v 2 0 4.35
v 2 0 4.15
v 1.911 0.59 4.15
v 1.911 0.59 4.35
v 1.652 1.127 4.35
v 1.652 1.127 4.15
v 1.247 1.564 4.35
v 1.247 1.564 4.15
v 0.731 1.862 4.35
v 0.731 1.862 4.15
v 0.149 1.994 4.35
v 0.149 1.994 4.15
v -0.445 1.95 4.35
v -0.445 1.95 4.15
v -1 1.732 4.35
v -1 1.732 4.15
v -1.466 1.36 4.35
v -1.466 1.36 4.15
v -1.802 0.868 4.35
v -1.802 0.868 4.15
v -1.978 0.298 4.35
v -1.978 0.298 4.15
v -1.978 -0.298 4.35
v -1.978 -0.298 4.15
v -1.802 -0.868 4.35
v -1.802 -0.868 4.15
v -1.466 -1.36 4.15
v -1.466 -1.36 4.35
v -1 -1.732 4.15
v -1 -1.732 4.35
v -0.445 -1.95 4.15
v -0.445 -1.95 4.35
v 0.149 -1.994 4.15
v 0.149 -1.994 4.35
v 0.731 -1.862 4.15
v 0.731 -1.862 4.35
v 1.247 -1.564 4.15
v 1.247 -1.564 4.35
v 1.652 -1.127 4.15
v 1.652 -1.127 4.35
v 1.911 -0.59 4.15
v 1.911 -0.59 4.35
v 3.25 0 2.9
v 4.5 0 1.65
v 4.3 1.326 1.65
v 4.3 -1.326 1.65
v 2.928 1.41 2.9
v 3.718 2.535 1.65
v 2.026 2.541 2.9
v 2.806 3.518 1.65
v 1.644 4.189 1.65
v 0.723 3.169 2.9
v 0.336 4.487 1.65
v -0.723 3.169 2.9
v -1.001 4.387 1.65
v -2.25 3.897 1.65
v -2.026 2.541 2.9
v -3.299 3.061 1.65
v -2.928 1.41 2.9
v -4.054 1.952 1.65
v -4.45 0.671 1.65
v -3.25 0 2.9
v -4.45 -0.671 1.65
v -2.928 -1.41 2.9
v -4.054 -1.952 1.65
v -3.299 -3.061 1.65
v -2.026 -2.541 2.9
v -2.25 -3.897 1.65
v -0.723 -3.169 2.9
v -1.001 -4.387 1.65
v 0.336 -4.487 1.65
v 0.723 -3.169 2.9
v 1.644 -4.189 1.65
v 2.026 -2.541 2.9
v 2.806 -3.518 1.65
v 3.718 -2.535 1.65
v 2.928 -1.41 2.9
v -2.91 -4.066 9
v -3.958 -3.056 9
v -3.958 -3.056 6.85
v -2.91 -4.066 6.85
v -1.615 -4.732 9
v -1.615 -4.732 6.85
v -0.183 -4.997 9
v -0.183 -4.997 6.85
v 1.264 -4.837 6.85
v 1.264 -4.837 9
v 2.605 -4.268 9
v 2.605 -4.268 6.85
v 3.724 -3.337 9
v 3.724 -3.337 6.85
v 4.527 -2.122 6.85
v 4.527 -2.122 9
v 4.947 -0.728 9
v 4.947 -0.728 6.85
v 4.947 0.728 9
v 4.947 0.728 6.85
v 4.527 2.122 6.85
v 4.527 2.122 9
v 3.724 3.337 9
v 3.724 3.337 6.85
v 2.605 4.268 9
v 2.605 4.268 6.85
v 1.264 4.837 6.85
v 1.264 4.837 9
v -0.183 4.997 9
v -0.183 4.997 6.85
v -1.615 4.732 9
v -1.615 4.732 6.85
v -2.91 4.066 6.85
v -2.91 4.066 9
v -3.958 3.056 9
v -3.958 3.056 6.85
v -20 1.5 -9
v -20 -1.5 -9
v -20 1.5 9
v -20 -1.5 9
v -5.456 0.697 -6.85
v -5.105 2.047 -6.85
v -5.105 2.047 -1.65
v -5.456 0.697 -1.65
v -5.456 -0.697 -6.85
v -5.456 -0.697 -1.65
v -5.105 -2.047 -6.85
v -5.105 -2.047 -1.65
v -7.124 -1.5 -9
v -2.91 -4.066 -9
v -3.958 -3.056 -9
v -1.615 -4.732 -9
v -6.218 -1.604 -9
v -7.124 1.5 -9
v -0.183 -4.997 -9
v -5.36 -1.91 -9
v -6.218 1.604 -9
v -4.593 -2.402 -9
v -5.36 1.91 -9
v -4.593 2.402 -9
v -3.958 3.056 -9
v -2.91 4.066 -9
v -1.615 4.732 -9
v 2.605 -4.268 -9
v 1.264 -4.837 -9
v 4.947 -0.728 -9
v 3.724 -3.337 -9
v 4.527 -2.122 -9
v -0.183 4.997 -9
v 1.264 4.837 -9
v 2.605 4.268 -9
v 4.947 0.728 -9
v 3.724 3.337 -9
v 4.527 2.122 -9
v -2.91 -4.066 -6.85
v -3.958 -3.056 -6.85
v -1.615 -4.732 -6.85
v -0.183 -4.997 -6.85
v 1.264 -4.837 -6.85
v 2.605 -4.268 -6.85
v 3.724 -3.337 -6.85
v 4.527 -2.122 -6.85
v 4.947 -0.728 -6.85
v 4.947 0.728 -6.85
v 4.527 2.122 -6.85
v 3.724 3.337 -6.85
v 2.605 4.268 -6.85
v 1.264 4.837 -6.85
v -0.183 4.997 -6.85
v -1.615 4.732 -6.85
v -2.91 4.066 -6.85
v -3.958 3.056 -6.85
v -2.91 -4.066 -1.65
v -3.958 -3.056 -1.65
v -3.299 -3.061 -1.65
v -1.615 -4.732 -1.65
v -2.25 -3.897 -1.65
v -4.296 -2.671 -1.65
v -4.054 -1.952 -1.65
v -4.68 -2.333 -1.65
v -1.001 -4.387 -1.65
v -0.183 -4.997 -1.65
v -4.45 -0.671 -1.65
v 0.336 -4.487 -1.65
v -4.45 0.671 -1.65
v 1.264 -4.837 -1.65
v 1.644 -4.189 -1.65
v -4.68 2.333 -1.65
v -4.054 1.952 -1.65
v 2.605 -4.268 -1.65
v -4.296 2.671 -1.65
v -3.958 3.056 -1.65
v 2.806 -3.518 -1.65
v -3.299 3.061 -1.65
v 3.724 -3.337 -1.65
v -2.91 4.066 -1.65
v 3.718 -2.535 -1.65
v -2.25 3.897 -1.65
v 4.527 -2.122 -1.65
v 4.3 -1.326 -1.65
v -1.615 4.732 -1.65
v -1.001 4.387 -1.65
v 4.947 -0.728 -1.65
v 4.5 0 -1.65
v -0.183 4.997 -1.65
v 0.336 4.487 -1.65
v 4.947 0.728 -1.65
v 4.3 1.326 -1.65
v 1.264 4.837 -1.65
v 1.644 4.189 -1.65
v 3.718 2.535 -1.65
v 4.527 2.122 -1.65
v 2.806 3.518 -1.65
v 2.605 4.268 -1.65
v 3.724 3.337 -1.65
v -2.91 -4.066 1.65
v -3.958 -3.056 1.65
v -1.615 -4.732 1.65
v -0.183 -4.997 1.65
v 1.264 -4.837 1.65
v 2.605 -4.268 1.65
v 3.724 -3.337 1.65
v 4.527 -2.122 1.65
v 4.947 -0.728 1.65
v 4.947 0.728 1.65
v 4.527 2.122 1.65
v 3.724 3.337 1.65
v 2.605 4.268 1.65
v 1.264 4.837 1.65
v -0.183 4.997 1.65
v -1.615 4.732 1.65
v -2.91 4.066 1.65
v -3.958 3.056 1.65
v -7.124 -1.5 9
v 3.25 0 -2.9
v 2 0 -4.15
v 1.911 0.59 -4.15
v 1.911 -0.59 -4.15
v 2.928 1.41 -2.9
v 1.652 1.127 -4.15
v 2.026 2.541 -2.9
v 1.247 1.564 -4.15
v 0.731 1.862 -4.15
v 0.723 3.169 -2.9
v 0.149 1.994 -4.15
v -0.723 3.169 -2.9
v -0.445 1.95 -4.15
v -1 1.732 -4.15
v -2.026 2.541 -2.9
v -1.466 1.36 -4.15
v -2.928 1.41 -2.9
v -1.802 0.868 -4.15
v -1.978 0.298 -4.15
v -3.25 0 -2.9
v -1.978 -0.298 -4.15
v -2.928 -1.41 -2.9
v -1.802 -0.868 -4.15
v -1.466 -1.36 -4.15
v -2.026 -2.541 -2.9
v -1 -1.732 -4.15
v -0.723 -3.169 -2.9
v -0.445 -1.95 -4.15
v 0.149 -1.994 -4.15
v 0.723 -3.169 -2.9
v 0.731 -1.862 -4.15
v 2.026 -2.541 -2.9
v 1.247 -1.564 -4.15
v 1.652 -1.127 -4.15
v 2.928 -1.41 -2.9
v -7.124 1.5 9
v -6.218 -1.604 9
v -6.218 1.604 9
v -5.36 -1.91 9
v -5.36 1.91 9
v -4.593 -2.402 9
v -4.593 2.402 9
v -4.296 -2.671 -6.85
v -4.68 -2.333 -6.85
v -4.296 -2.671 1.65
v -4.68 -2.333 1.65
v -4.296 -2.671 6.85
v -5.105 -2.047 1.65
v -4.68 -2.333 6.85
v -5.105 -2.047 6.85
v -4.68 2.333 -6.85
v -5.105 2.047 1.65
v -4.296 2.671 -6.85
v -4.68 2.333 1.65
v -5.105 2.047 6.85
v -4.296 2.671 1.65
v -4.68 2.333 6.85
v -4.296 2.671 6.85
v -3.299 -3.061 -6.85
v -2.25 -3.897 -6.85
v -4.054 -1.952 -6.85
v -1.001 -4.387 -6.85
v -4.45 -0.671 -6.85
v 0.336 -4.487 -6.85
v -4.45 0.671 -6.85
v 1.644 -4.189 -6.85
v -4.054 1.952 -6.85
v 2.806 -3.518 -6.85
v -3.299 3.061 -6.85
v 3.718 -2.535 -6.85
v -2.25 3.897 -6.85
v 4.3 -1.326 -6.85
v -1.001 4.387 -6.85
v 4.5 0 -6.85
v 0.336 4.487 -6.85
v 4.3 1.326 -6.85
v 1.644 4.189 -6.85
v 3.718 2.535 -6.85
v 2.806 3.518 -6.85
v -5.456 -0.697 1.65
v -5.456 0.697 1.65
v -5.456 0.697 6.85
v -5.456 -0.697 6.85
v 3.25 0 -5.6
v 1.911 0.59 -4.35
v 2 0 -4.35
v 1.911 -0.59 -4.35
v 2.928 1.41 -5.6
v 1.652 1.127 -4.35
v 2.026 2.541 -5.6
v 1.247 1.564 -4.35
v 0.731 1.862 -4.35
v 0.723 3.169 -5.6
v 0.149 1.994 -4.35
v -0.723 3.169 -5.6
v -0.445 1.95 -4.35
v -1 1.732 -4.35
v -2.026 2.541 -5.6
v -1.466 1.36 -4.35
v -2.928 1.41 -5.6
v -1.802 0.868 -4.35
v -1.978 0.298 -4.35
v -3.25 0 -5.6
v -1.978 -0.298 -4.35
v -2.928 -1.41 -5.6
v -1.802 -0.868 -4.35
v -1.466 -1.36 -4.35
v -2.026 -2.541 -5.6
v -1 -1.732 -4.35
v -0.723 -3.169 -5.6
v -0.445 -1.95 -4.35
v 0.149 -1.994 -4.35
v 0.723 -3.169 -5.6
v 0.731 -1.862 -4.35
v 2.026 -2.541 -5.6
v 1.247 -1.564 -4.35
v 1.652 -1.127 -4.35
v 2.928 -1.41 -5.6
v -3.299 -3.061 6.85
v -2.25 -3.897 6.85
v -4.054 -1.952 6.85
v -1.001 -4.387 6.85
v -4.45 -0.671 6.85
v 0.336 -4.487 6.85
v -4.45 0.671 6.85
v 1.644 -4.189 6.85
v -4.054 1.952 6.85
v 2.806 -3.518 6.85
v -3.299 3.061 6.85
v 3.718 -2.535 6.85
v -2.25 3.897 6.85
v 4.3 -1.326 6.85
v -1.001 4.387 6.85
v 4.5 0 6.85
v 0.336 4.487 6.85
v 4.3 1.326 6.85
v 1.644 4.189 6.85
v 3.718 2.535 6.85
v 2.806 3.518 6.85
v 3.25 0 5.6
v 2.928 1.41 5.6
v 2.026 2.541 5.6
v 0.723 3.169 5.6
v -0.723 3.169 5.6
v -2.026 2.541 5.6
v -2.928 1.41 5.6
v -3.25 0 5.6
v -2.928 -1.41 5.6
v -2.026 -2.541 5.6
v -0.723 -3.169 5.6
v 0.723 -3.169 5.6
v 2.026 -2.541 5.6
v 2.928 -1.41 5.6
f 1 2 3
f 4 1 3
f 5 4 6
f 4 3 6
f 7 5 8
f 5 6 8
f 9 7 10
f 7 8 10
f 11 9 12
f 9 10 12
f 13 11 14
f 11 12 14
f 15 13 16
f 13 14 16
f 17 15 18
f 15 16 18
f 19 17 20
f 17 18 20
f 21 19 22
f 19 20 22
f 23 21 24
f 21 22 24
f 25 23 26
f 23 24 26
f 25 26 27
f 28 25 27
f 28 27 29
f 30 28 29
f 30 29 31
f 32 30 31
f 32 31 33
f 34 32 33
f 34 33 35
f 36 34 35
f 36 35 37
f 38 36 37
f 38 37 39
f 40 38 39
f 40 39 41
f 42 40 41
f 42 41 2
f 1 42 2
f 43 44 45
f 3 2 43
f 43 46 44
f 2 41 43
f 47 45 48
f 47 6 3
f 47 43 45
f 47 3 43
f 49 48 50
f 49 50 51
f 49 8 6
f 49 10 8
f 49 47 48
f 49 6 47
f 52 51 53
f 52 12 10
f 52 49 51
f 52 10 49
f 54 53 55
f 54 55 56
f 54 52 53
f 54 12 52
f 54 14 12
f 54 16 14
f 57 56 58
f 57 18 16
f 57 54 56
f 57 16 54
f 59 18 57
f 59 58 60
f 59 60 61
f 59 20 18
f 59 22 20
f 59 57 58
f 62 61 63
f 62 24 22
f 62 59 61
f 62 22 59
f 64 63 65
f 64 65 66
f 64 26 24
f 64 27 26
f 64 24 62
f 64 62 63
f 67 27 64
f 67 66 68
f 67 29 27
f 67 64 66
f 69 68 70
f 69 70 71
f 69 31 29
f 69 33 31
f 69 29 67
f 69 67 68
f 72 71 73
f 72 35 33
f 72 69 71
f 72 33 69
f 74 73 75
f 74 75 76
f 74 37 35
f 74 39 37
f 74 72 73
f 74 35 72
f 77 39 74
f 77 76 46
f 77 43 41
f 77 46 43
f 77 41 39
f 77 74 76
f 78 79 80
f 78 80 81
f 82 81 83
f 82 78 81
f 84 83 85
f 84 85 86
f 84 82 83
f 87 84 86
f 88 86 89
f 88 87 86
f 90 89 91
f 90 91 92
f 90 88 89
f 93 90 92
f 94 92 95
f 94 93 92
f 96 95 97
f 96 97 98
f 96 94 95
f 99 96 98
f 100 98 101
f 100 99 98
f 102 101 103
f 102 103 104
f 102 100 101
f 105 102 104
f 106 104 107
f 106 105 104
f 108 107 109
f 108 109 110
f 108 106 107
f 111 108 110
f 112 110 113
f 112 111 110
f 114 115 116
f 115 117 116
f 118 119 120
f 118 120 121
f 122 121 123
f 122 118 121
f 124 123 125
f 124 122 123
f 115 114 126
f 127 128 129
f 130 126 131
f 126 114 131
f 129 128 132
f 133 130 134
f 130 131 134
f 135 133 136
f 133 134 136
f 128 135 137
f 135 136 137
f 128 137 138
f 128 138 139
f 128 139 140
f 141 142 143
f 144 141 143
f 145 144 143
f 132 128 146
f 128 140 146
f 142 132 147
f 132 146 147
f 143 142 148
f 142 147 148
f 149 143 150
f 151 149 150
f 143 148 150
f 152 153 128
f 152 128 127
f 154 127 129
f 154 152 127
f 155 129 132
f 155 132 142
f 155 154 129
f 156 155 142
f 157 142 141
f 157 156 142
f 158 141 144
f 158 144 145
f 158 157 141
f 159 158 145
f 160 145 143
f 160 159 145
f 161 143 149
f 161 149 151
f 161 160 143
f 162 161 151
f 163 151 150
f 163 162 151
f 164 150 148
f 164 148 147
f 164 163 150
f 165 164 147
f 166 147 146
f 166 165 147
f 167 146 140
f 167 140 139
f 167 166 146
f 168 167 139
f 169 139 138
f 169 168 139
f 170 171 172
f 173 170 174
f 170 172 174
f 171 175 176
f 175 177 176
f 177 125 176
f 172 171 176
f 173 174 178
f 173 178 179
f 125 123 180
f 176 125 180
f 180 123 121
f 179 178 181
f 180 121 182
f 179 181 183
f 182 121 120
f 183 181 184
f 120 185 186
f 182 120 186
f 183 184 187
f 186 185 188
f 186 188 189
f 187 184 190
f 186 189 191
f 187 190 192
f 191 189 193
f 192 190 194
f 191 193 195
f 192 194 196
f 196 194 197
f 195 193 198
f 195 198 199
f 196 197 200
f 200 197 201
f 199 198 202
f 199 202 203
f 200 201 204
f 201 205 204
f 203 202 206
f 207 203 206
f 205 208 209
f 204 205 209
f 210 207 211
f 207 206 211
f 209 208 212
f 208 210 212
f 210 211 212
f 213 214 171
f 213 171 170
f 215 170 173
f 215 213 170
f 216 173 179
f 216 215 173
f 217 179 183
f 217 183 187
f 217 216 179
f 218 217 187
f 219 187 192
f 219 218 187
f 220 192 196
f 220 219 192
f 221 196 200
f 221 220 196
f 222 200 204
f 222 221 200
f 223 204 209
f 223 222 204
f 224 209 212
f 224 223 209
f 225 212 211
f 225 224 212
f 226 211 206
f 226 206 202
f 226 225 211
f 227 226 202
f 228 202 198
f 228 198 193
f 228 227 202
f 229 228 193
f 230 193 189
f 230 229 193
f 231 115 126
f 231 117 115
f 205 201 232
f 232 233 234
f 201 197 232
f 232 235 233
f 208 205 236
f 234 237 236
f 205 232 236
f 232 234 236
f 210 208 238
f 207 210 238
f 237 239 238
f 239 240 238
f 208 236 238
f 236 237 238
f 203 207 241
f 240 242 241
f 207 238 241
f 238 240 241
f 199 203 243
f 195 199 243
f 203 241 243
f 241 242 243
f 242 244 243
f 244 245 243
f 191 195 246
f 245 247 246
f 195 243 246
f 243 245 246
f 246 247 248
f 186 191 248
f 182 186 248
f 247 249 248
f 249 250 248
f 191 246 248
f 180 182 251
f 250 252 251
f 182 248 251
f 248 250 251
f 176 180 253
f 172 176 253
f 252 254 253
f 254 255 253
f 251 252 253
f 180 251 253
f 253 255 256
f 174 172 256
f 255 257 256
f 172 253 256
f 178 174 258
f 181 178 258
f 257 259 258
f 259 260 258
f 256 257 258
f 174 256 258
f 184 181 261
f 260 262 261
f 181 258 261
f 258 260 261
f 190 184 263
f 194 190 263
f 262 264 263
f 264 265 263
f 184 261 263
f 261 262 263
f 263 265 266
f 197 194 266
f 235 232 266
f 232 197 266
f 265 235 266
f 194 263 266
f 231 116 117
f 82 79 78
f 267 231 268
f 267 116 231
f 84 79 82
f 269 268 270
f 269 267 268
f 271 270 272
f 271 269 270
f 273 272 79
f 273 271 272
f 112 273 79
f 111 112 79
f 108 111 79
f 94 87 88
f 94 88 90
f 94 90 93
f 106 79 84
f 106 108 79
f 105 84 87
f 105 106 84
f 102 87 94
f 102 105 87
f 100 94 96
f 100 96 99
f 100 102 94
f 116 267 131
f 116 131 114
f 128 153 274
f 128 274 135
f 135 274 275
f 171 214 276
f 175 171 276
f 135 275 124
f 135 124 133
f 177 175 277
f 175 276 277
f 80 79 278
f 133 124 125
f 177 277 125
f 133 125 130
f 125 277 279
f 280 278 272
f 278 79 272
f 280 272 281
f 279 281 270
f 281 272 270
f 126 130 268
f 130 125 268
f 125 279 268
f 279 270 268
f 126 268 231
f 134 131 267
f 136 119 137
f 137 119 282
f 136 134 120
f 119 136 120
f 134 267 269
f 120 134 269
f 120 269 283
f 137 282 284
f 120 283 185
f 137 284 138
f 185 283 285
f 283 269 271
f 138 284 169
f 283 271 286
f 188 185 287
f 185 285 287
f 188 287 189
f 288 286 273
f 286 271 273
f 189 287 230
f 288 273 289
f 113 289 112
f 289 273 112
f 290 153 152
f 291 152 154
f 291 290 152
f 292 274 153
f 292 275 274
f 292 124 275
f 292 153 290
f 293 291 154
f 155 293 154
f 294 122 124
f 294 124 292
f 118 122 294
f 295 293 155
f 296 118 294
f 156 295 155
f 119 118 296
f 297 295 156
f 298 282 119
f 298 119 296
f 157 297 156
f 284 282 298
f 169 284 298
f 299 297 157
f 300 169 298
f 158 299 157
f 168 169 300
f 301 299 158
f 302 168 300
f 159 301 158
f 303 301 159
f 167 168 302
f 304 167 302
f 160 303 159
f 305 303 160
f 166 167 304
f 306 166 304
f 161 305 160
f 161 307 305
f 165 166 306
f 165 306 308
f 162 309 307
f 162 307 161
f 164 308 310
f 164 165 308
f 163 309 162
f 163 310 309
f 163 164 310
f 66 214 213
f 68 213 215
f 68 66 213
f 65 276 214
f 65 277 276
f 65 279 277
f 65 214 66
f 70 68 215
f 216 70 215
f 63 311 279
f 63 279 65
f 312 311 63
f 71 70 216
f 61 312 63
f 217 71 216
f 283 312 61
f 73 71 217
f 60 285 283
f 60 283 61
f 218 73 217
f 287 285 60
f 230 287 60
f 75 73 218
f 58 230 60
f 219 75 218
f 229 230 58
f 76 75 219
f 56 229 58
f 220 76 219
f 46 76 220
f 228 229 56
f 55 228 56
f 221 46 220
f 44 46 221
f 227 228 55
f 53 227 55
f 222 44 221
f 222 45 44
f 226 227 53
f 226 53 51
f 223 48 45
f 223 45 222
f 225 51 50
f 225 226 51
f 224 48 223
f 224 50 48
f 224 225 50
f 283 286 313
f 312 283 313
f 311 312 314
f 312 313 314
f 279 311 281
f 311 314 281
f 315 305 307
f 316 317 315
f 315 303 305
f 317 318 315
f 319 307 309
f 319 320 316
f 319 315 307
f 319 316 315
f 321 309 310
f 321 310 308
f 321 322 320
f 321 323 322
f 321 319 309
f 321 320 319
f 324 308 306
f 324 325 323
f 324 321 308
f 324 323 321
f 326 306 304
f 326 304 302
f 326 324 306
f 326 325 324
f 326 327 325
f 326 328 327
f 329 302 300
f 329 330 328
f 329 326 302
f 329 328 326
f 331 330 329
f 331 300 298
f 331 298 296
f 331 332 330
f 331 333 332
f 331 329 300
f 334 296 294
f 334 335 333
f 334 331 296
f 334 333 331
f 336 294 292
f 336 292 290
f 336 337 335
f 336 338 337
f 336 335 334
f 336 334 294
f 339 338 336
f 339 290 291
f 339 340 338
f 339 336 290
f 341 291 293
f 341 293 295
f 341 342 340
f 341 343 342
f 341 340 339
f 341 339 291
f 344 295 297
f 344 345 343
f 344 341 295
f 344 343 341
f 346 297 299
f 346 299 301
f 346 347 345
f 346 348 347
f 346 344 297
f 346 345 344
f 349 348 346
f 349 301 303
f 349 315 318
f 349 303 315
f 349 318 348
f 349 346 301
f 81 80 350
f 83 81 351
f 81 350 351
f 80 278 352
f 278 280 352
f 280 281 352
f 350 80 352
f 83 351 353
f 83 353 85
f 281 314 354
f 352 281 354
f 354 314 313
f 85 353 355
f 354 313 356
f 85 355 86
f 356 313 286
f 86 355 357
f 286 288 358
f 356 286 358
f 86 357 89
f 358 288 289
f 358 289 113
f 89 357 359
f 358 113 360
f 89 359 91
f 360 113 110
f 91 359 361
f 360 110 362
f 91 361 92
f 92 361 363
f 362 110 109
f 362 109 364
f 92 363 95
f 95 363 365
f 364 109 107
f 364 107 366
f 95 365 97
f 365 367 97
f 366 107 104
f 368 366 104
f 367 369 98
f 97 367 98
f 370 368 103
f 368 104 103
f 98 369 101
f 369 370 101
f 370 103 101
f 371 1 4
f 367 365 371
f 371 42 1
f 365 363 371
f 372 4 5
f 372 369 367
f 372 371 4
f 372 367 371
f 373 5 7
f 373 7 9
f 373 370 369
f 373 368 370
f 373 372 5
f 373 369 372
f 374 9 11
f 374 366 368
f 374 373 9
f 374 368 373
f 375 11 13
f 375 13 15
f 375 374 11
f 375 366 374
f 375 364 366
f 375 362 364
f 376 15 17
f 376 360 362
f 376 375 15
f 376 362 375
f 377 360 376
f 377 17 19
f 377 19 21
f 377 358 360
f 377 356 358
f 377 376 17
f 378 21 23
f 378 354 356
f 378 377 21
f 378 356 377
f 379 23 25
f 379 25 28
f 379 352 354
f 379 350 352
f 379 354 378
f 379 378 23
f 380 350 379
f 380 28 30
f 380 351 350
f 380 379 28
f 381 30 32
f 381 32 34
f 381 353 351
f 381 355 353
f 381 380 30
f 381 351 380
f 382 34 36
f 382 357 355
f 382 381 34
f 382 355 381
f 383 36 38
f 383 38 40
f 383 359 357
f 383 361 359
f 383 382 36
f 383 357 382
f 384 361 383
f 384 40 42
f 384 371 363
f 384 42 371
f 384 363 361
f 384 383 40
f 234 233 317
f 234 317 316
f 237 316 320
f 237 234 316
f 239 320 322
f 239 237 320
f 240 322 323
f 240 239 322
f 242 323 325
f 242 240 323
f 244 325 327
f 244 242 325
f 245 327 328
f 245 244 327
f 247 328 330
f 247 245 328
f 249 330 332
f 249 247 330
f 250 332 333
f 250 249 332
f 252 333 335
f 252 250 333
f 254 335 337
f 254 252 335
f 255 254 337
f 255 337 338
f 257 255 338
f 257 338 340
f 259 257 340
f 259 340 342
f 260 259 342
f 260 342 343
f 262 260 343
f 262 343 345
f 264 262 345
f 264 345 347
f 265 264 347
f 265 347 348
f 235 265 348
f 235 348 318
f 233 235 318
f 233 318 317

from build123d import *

# Parameters (mm, degrees)
PAD001_DEPTH  = 9
SKETCH005_R   = 5.5
SKETCH005_R_2 = 2
POCKET_DEPTH  = 2.6
CHAMFER_SIZE  = 2.5


with BuildPart() as part:
    # Sketch003 → Pad001 (new body, symmetric)
    with BuildSketch(Plane.XY):
        with BuildLine():
            ThreePointArc((-3.9577139867, -3.0555686868), (5, -2.4e-09), (-3.9577139837, 3.0555686906))
            ThreePointArc((-7.1239026623, 1.5), (-5.3600614281, 1.9098939553), (-3.9577139838, 3.0555686907))
            Line((-7.1239026623, 1.5), (-20, 1.5))
            Line((-20, -1.5), (-20, 1.5))
            Line((-20, -1.5), (-7.1239026639, -1.5))
            ThreePointArc((-3.9577139867, -3.0555686868), (-5.360061431, -1.9098939539), (-7.1239026639, -1.5))
        make_face()
    extrude(amount=PAD001_DEPTH, both=True)

    # Sketch005 → Pocket (cut, symmetric)
    with BuildSketch(Plane.XY.offset(4.25)):
        Circle(SKETCH005_R)
        Circle(SKETCH005_R_2, mode=Mode.SUBTRACT)
    pocket = extrude(amount=POCKET_DEPTH, both=True, mode=Mode.SUBTRACT)

    # Mirrored: Pocket across XY
    add(pocket.mirror(Plane.XY), mode=Mode.SUBTRACT)

    # Chamfer
    chamfer_edges = [part.edges().sort_by_distance(p)[0] for p in [
        (-2, 0, -6.85),
        (-2, 0, 1.65),
        (-2, 0, 6.85),
        (-2, 0, -1.65),
    ]]
    chamfer(chamfer_edges, length=CHAMFER_SIZE)


solid = part.part
